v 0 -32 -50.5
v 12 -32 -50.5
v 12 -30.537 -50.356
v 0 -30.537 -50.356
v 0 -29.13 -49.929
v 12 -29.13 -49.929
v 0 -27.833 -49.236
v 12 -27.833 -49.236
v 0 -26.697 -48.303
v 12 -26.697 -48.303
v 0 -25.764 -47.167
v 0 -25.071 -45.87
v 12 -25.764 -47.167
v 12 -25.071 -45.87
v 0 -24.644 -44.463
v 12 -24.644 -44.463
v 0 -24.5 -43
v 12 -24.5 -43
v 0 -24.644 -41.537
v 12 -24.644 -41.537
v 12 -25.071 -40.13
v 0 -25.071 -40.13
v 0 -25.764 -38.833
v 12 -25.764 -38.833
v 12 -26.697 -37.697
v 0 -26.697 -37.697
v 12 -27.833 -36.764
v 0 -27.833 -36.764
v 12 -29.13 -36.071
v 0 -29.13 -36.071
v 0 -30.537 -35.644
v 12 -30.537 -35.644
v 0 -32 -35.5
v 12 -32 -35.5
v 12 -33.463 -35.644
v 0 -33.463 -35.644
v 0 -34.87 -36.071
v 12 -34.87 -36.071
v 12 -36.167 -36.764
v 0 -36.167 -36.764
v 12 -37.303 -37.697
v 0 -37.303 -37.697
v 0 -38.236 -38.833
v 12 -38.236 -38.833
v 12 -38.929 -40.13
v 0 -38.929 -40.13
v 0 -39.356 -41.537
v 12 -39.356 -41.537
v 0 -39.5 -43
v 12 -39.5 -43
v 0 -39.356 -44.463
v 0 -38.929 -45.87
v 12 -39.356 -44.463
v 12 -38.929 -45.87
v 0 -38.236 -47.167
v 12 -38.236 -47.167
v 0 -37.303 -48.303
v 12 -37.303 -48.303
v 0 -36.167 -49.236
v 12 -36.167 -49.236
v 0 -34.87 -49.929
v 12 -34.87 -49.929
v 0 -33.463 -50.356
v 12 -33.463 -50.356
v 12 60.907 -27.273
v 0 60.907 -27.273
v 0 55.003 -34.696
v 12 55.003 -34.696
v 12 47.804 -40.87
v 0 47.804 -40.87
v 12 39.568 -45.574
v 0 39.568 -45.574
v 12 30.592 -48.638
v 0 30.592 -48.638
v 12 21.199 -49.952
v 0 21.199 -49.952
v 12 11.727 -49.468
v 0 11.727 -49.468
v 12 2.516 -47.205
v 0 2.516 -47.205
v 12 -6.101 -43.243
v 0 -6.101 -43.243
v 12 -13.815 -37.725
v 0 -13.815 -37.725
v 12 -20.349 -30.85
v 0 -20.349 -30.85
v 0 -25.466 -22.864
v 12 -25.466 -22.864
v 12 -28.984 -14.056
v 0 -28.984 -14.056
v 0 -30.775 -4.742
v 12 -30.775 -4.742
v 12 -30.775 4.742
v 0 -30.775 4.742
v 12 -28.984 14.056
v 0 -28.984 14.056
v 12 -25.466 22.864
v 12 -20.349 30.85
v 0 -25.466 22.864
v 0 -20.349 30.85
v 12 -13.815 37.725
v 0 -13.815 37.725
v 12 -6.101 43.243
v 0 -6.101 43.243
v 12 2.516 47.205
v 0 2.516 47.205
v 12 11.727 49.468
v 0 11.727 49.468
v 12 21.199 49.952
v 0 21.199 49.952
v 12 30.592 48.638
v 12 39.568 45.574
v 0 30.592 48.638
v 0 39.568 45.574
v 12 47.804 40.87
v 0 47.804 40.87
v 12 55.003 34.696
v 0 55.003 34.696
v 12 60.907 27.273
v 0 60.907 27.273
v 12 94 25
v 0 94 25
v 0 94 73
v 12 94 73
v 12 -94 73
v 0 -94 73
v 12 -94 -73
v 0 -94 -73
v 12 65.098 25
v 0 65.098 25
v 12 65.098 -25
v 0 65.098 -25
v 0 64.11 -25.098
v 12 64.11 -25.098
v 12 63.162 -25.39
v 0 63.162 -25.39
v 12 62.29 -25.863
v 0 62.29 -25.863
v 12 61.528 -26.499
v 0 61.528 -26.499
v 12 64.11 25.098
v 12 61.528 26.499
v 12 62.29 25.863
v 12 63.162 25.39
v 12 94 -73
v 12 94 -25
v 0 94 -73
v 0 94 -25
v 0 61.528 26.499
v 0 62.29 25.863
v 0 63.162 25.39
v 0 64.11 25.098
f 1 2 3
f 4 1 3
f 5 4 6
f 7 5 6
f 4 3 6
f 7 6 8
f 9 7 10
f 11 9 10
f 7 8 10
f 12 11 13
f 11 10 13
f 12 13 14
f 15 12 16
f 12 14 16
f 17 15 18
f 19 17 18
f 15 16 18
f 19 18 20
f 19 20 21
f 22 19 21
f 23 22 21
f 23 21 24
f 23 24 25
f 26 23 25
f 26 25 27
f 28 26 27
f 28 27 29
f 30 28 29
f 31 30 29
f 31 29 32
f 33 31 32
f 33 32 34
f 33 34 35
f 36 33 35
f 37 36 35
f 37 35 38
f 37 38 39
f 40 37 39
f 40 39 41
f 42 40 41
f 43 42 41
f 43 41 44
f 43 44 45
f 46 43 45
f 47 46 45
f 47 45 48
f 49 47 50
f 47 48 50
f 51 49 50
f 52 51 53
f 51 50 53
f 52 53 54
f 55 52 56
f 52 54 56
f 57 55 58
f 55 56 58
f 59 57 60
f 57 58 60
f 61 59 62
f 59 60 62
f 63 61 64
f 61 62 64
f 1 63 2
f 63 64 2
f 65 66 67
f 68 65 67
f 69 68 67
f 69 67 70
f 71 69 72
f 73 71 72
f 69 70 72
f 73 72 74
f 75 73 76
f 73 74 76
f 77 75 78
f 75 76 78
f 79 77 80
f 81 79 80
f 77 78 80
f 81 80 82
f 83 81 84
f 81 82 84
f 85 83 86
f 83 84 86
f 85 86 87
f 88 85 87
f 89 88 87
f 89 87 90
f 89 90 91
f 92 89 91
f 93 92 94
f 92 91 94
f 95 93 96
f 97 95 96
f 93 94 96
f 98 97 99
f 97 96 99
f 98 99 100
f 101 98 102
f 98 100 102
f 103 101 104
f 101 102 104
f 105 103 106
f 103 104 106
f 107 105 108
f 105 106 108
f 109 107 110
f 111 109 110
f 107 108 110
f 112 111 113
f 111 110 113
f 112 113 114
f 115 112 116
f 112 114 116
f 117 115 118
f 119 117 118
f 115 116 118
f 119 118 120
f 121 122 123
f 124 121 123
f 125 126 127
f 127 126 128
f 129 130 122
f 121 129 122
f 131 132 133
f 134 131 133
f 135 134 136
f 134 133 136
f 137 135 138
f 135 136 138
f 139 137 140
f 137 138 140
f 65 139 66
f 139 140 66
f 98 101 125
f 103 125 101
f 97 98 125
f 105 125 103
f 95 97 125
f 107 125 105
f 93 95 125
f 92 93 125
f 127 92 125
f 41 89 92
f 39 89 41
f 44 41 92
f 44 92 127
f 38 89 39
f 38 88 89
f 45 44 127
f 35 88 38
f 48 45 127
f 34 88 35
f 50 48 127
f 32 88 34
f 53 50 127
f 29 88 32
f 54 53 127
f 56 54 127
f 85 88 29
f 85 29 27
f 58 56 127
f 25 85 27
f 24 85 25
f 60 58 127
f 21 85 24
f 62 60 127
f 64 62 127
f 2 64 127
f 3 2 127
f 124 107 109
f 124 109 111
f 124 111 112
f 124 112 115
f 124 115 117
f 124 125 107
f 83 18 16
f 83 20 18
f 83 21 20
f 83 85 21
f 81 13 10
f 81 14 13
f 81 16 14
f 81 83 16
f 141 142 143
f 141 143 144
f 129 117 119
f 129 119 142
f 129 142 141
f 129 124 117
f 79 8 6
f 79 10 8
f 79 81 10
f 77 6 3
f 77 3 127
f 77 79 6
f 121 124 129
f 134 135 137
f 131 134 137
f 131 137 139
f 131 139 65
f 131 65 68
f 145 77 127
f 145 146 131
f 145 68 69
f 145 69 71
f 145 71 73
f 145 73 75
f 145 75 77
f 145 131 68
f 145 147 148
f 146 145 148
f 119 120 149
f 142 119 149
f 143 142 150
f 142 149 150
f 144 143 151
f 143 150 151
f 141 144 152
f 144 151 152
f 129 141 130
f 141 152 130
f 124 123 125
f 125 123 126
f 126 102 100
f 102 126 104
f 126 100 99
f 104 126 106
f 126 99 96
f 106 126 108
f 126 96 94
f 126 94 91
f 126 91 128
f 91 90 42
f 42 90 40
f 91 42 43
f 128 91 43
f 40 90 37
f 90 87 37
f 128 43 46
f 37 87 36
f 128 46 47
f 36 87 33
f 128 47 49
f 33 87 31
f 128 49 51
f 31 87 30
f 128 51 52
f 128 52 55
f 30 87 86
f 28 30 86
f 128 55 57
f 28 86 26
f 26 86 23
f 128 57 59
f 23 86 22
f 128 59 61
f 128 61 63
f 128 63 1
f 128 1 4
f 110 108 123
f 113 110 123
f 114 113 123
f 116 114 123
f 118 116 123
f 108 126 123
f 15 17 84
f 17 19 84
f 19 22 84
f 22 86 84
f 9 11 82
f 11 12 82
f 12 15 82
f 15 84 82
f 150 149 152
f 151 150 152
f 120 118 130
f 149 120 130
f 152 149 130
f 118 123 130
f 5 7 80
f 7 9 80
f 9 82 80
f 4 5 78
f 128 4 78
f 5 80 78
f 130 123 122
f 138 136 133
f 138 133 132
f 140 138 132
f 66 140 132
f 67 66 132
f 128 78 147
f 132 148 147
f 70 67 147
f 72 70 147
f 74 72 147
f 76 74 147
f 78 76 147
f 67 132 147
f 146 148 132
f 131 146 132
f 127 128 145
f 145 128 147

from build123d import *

# Parameters (mm, degrees)
BOSS_EXTRUDE1_DEPTH = 12
SKETCH2_R           = 7.5
CUT_EXTRUDE1_DEPTH  = 120.620232402


with BuildPart() as part:
    # Sketch1 → Boss-Extrude1 (new body)
    with BuildSketch(Plane(origin=(0, 0, 0), x_dir=(0, 0, -1), z_dir=(1, 0, 0))):
        with BuildLine():
            Line((73, 94), (25, 94))
            Line((25, 94), (25, 65.097722286))
            ThreePointArc((25, 65.097722286), (25.604754635, 62.714065813), (27.272727273, 60.90702026))
            ThreePointArc((27.272727273, 60.90702026), (0, -31), (-27.272727273, 60.90702026))
            ThreePointArc((-27.272727273, 60.90702026), (-25.604754635, 62.714065813), (-25, 65.097722286))
            Line((-25, 65.097722286), (-25, 94))
            Line((-25, 94), (-73, 94))
            Line((-73, 94), (-73, -94))
            Line((-73, -94), (73, -94))
            Line((73, -94), (73, 94))
        make_face()
    extrude(amount=BOSS_EXTRUDE1_DEPTH)

    # Sketch2 → Cut-Extrude1 (cut, through all)
    with BuildSketch(Plane(origin=(12, 0, 0), x_dir=(0, 0, -1), z_dir=(1, 0, 0))):
        with Locations((43, -32)):
            Circle(SKETCH2_R)
    extrude(amount=-CUT_EXTRUDE1_DEPTH, mode=Mode.SUBTRACT)


solid = part.part
